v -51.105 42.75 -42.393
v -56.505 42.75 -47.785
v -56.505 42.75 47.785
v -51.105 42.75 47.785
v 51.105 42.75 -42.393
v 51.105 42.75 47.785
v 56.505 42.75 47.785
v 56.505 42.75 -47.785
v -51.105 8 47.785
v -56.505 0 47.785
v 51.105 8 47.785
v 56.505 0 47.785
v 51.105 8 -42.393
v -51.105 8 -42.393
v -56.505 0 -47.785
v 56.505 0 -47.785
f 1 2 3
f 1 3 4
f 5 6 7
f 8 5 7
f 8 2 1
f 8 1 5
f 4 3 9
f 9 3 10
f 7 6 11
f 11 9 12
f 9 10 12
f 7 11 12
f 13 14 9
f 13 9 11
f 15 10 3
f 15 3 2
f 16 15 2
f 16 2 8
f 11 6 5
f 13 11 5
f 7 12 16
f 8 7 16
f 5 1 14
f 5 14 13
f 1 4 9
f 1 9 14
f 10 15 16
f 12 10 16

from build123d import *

# Parameters (mm, degrees)
SKETCH1_W           = 113.01
SKETCH1_H           = 95.57
BOSS_EXTRUDE1_DEPTH = 42.75
SKETCH3_W           = 102.21
SKETCH3_H           = 90.17
CUT_EXTRUDE1_DEPTH  = 34.75
SKETCH6_W           = 102.21
SKETCH6_H           = 8.948308689
CUT_EXTRUDE2_DEPTH  = 34.75


with BuildPart() as part:
    # Sketch1 → Boss-Extrude1 (new body)
    with BuildSketch(Plane(origin=(0, 0, 0), x_dir=(1, 0, 0), z_dir=(0, 1, 0))):
        Rectangle(SKETCH1_W, SKETCH1_H)
    extrude(amount=BOSS_EXTRUDE1_DEPTH)

    # Sketch3 → Cut-Extrude1 (cut)
    with BuildSketch(Plane(origin=(0, 42.75, 0), x_dir=(1, 0, 0), z_dir=(0, 1, 0))):
        with Locations((0, -2.692303692)):
            Rectangle(SKETCH3_W, SKETCH3_H)
    extrude(amount=-CUT_EXTRUDE1_DEPTH, mode=Mode.SUBTRACT)

    # Sketch6 → Cut-Extrude2 (cut)
    with BuildSketch(Plane(origin=(0, 42.75, 0), x_dir=(1, 0, 0), z_dir=(0, 1, 0))):
        with Locations((0, -47.777303693)):
            Rectangle(SKETCH6_W, SKETCH6_H)
    extrude(amount=-CUT_EXTRUDE2_DEPTH, mode=Mode.SUBTRACT)


solid = part.part
